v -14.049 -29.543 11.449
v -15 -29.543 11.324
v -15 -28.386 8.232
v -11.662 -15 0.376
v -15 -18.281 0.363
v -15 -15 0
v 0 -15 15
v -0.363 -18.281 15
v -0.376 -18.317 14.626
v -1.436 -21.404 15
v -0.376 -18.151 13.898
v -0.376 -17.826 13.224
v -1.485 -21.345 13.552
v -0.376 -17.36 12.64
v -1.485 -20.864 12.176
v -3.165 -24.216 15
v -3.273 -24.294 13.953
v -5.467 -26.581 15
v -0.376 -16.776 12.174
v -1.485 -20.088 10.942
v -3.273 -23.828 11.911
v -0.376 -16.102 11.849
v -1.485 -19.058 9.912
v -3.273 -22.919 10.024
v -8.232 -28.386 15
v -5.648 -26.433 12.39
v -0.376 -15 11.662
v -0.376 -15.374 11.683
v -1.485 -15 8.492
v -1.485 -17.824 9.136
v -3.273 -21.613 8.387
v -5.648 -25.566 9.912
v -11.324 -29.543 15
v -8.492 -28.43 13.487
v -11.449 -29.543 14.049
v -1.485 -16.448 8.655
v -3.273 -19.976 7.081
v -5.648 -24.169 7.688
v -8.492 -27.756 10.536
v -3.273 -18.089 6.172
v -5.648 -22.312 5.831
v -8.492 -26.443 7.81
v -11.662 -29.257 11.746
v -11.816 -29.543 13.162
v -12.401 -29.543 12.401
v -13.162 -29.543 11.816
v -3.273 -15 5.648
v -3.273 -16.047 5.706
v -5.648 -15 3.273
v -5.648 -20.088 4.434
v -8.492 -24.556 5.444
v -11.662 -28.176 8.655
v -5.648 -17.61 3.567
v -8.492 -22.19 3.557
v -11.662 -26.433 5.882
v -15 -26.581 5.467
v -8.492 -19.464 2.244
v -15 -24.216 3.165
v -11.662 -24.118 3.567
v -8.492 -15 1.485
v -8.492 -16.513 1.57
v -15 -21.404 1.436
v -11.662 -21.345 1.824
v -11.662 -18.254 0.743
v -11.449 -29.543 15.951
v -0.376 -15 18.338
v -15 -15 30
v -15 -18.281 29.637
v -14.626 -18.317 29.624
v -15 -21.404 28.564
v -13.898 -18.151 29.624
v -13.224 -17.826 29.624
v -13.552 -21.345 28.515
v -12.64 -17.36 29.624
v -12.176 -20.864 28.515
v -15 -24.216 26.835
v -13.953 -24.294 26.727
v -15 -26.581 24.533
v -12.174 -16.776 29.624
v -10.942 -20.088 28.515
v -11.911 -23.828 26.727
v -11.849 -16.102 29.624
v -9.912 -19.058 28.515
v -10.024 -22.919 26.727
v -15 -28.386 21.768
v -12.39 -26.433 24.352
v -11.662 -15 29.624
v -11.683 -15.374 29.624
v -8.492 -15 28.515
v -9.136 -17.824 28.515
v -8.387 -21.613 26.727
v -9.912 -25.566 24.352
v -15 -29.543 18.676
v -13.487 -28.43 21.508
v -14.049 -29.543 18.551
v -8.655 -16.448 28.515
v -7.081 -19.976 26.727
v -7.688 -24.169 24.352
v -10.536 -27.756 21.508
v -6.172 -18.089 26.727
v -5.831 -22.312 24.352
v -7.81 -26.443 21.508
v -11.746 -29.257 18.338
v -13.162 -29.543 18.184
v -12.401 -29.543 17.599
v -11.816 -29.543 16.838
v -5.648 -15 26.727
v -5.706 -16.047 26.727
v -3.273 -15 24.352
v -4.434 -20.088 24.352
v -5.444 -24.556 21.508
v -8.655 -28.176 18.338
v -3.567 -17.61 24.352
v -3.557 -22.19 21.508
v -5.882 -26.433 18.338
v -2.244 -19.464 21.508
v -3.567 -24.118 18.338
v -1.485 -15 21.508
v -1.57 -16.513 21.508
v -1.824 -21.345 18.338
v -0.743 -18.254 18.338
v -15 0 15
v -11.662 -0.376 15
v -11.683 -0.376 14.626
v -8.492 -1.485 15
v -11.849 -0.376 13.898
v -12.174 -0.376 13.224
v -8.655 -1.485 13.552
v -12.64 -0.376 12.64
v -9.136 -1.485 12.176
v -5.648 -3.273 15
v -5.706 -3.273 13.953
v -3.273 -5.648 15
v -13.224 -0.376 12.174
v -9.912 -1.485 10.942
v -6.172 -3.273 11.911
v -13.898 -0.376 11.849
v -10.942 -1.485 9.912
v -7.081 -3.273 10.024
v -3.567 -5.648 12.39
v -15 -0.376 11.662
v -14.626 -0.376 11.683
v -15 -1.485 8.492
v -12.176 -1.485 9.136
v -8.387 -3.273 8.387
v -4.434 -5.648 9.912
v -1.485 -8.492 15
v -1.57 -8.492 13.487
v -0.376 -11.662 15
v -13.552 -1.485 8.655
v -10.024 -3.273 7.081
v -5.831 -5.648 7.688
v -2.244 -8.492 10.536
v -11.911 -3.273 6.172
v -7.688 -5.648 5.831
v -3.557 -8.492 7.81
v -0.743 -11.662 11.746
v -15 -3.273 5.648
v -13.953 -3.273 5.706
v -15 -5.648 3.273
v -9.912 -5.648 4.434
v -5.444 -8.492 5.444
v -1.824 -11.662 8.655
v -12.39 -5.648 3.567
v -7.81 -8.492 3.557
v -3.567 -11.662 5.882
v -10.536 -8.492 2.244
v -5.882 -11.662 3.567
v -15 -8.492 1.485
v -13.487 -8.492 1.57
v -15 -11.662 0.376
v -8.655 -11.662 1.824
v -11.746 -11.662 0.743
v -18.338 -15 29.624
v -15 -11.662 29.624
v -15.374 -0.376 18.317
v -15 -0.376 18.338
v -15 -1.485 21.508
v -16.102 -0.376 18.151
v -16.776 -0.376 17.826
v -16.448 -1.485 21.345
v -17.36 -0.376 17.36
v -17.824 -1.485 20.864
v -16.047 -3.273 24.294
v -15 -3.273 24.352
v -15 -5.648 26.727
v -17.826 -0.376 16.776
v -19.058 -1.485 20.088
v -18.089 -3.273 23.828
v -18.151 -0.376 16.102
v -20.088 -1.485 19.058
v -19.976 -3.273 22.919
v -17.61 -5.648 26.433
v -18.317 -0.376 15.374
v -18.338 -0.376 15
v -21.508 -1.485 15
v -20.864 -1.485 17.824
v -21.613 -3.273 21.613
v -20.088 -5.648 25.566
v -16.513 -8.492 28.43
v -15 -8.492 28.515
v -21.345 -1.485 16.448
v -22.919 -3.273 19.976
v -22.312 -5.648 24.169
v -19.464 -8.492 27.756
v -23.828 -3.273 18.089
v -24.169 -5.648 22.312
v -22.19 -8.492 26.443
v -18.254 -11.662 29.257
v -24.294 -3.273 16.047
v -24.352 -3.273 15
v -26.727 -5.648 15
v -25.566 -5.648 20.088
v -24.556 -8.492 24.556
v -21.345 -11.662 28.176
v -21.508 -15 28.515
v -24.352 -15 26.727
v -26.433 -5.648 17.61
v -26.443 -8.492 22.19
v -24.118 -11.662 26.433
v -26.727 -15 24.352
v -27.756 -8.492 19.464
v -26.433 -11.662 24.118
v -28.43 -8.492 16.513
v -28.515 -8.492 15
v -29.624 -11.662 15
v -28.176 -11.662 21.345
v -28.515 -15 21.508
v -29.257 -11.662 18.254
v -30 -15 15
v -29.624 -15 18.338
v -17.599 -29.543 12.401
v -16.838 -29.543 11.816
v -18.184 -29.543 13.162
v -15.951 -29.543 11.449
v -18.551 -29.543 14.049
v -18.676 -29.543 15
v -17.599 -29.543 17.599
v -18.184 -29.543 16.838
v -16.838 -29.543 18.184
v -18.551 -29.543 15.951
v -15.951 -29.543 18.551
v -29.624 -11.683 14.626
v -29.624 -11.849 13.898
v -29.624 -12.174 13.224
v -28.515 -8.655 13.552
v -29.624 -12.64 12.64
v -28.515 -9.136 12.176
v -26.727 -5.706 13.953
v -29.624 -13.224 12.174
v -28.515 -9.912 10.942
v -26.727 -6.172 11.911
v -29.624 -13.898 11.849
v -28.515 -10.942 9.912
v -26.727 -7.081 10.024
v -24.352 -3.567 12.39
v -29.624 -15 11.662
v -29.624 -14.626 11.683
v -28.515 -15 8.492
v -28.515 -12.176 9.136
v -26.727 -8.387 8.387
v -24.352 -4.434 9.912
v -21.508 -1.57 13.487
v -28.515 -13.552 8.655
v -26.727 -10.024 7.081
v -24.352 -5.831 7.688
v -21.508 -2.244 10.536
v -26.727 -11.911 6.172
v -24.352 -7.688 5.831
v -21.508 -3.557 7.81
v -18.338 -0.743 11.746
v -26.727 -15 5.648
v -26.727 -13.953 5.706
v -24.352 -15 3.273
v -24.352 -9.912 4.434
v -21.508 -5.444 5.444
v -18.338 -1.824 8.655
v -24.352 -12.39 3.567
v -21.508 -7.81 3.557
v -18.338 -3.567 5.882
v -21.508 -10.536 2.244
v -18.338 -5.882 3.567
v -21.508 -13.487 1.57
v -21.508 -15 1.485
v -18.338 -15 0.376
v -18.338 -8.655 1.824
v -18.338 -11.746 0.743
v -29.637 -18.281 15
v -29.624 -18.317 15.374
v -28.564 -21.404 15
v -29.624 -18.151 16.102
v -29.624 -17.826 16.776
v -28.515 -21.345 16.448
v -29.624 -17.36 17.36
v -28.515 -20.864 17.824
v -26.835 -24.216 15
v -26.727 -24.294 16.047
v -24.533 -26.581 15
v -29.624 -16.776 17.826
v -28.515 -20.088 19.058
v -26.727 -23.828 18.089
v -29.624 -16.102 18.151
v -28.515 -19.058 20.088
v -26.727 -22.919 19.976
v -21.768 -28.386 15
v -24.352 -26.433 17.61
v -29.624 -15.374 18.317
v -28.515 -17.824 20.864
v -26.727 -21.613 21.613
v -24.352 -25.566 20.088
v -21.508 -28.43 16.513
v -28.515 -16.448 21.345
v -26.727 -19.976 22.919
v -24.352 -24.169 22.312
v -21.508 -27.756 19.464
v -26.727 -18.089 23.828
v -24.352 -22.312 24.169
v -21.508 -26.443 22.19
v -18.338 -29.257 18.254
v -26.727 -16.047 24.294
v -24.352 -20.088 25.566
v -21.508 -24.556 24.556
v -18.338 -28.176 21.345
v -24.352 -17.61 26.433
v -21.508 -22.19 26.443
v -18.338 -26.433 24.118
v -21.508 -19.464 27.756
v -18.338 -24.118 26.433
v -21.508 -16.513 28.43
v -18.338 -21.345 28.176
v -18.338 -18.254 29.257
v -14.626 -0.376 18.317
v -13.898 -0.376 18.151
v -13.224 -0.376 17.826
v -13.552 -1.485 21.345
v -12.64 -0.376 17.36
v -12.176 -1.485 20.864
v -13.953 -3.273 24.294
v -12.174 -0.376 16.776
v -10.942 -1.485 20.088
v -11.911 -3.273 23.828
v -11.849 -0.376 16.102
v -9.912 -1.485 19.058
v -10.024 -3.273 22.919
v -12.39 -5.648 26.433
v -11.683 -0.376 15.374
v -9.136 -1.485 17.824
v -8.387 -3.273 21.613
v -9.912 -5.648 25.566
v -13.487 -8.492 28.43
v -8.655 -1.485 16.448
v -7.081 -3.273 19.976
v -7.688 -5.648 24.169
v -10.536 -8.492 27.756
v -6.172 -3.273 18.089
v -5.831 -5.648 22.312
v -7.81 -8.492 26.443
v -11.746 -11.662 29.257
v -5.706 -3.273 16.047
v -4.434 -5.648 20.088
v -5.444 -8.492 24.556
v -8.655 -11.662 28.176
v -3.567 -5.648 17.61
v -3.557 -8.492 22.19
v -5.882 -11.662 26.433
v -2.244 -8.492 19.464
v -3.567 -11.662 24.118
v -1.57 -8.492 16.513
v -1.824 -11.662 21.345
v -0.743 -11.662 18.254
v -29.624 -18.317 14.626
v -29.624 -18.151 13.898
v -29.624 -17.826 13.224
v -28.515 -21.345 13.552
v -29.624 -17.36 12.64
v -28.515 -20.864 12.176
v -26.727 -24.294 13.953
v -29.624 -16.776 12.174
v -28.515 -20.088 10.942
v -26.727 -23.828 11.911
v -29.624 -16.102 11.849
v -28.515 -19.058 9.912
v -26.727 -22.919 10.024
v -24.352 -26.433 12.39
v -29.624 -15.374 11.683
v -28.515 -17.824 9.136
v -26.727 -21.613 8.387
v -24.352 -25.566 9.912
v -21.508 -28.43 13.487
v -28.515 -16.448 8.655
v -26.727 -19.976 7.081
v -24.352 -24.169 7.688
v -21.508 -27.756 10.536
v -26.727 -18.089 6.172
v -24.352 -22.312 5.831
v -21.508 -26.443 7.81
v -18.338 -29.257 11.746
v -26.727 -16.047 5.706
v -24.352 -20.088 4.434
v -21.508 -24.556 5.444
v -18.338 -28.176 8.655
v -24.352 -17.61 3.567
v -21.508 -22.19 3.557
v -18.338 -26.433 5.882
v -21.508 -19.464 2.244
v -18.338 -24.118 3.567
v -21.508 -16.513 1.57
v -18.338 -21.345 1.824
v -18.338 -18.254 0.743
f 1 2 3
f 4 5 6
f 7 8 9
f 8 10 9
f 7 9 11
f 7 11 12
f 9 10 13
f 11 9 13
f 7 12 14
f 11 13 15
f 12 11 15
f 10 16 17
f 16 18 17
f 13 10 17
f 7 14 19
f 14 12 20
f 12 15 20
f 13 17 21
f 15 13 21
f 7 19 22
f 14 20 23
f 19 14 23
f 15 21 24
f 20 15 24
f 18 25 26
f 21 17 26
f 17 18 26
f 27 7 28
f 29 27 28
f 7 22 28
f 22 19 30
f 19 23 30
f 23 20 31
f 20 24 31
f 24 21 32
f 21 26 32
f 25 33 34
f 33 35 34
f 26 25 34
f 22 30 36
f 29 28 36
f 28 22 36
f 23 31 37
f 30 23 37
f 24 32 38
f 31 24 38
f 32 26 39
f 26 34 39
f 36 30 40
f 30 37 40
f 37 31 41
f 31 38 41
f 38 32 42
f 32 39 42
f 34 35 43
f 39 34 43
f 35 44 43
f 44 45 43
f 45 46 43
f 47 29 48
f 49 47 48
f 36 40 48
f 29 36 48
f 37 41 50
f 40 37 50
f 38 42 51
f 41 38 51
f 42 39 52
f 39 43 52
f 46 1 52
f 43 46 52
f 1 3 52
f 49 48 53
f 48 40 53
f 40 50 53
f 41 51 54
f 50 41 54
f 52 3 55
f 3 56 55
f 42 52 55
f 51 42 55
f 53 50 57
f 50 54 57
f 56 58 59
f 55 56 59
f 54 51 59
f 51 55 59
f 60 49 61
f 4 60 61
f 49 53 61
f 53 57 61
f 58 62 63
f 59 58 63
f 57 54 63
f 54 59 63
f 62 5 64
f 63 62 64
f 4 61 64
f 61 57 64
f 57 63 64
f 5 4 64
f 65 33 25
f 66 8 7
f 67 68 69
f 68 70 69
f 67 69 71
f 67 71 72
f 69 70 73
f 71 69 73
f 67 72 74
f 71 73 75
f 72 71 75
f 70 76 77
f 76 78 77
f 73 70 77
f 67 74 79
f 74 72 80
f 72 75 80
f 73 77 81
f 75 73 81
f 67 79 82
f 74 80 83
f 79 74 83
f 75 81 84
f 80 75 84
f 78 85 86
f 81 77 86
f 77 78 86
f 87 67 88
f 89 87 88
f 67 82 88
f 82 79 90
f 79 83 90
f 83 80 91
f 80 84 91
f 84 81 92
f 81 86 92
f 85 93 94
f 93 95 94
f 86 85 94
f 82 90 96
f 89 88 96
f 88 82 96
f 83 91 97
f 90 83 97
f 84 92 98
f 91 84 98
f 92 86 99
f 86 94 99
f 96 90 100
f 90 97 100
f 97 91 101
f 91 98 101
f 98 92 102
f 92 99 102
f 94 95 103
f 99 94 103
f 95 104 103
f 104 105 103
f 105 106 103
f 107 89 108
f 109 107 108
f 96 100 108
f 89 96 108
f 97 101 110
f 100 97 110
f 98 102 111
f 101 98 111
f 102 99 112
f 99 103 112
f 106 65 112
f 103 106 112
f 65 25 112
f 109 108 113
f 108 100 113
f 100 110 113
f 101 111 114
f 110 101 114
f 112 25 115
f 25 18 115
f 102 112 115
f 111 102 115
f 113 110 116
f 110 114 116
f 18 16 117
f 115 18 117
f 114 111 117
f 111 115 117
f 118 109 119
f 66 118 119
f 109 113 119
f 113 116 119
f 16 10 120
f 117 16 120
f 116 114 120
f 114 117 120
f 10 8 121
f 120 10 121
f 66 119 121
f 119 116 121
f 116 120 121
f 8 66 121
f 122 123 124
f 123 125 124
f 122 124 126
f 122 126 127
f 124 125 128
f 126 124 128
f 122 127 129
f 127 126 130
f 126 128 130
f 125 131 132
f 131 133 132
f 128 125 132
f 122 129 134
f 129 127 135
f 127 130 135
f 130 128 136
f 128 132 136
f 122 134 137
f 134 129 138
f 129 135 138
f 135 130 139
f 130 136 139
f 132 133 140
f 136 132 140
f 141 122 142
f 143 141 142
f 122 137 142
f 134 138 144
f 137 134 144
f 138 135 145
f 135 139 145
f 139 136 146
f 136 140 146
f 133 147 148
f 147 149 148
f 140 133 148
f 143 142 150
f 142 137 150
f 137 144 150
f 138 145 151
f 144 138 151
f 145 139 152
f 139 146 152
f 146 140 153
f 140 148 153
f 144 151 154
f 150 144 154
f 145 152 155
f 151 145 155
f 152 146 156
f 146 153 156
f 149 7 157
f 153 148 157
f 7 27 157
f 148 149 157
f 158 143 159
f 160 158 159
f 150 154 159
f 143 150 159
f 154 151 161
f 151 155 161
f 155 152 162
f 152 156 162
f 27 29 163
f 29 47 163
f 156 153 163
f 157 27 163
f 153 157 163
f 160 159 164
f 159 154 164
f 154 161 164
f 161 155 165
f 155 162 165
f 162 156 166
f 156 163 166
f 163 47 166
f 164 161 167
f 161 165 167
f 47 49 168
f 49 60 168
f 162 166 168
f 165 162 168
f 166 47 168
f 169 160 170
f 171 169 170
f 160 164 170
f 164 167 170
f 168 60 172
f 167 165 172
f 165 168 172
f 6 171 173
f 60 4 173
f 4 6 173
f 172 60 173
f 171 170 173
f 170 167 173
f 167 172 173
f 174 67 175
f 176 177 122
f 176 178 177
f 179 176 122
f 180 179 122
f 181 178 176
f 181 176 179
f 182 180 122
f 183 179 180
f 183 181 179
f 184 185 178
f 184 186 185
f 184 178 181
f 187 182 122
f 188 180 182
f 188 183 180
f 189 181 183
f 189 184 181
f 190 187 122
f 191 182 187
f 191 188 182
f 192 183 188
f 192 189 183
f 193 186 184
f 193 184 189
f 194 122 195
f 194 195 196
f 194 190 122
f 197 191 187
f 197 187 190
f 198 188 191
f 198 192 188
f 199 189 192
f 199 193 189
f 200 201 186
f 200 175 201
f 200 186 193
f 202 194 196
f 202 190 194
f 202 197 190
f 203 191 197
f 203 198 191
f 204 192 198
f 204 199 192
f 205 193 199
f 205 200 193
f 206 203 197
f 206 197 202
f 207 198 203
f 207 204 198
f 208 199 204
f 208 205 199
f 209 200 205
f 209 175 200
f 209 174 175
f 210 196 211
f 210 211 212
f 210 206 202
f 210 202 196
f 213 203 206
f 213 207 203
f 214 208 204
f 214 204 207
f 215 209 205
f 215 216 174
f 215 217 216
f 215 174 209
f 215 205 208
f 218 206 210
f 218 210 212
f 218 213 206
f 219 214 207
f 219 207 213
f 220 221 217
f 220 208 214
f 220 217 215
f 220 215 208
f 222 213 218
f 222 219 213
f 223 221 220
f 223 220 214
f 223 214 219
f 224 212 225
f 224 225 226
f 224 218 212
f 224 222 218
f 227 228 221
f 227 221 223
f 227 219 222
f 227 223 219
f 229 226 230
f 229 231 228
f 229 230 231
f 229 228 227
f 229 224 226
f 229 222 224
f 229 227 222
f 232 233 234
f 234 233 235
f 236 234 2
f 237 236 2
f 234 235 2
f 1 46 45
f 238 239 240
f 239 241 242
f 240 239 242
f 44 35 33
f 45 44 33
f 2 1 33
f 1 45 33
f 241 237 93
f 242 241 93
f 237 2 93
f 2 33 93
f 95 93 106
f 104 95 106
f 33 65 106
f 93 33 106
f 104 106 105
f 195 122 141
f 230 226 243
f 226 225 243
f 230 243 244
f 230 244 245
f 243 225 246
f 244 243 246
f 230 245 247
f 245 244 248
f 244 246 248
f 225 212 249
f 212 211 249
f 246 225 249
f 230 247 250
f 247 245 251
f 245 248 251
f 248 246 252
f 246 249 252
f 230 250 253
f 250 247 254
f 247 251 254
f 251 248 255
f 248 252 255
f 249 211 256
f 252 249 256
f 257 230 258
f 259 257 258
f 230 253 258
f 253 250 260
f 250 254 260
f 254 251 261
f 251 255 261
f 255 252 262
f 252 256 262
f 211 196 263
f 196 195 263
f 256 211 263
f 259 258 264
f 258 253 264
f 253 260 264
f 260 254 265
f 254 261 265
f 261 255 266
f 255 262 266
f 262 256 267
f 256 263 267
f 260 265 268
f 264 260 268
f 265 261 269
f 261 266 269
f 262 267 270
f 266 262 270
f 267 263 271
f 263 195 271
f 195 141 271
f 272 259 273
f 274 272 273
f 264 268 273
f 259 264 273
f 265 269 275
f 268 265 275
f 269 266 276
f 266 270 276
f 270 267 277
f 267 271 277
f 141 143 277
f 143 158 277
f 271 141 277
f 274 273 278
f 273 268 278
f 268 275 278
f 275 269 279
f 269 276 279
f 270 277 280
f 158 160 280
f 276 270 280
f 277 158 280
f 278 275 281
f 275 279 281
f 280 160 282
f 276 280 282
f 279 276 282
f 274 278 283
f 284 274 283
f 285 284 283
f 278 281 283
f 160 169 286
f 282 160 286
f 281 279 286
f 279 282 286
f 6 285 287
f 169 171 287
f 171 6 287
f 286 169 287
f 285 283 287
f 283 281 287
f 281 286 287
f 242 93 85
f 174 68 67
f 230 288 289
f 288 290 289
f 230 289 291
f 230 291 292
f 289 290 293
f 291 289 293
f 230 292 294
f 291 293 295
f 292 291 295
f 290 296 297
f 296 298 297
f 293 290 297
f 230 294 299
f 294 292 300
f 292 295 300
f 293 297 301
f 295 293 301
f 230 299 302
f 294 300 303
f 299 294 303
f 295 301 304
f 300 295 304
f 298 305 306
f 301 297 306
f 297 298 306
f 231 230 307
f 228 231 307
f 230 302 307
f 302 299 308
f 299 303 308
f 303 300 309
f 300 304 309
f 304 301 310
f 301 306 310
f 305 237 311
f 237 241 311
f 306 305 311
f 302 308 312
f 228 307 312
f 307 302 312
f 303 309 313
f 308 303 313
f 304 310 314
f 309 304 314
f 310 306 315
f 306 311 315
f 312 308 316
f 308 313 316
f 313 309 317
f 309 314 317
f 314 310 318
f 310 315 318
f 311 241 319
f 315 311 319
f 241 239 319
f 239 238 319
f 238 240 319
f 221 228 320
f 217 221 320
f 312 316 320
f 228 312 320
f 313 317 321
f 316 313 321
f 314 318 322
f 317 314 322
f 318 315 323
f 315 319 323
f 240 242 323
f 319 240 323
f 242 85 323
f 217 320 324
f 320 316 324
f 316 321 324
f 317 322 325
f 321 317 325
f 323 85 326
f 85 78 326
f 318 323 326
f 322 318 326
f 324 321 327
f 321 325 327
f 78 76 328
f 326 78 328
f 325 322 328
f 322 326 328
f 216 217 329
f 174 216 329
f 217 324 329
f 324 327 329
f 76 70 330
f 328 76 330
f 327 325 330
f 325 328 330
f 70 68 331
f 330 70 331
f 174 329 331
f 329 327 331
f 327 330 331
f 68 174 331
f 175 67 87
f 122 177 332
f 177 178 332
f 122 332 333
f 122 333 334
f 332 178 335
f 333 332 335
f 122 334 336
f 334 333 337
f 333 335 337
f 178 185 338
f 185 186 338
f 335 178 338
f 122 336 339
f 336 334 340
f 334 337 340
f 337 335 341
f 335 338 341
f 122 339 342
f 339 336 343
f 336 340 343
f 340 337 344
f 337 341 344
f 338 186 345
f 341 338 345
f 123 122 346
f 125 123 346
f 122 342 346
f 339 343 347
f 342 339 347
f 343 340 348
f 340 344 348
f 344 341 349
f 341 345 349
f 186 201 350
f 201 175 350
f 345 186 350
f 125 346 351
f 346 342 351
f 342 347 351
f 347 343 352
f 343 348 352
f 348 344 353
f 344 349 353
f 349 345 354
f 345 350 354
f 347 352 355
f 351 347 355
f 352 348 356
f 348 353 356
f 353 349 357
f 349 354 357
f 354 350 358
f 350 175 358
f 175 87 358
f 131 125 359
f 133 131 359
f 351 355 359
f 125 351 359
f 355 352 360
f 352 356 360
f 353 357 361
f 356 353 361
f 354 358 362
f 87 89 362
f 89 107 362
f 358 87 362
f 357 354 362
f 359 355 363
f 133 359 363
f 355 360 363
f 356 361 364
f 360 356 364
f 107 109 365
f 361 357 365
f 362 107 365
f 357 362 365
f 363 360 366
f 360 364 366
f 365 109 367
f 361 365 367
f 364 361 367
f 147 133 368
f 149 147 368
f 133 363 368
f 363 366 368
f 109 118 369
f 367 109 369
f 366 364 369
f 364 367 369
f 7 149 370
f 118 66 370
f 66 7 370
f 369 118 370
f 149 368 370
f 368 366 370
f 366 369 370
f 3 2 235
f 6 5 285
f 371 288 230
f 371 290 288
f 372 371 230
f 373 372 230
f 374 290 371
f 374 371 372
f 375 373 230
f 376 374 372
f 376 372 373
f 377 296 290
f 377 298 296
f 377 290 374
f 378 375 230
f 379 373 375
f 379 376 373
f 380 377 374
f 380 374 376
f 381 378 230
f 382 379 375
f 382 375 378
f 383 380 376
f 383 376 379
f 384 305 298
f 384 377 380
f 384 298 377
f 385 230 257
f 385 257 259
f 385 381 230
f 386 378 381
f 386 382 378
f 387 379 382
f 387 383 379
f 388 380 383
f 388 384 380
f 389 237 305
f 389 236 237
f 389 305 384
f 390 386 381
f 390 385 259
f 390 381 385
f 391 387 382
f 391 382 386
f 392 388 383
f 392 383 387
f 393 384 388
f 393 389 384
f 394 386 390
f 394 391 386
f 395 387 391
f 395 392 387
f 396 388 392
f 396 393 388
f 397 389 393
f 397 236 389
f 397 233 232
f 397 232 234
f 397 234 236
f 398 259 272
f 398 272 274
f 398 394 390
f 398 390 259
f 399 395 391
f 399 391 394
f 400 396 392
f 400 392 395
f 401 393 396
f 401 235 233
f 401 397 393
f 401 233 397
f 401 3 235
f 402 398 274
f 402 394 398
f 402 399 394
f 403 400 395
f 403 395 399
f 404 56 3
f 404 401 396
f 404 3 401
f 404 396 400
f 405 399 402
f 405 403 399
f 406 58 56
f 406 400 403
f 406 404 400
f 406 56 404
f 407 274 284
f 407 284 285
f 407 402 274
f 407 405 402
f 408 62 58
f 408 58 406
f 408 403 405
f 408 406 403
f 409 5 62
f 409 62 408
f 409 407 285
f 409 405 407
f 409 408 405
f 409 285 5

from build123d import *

# Parameters (mm, degrees)
F0_W     = 30
F0_H     = 30
F1_DEPTH = 30
F2_R     = 14.99999
F3_W     = 1.993669197
F3_H     = 26.7333146185
F4_DEPTH = 30.001


# Not quite as in the source:
# - a fillet or chamfer is up to 0.001 mm smaller than in the source, because OpenCascade refuses the exact size


with BuildPart() as f1:
    # F0 (on Front) → F1 (new body)
    with BuildSketch(Plane.XZ):
        with Locations((-15, 15)):
            Rectangle(F0_W, F0_H)
    extrude(amount=F1_DEPTH)

    # F2 (radius 15 in the source; OpenCascade refuses exactly that, so slightly less here)
    f2_edges = [f1.edges().sort_by_distance(p)[0] for p in [
        (-15, -30, 0),
        (0, -30, 15),
        (-15, -30, 30),
        (-30, -30, 15),
        (0, -15, 30),
        (-30, -15, 30),
        (-15, 0, 30),
        (0, -15, 0),
        (0, 0, 15),
        (-15, 0, 0),
        (-30, 0, 15),
        (-30, -15, 0),
    ]]
    fillet(f2_edges, radius=F2_R)

    # F3 (on Right) → F4 (cut, through all)
    with BuildSketch(Plane.YZ):
        with Locations((-30.5394129828, 13.3666573092)):
            Rectangle(F3_W, F3_H)
    extrude(amount=-F4_DEPTH, mode=Mode.SUBTRACT)


solid = f1.part
